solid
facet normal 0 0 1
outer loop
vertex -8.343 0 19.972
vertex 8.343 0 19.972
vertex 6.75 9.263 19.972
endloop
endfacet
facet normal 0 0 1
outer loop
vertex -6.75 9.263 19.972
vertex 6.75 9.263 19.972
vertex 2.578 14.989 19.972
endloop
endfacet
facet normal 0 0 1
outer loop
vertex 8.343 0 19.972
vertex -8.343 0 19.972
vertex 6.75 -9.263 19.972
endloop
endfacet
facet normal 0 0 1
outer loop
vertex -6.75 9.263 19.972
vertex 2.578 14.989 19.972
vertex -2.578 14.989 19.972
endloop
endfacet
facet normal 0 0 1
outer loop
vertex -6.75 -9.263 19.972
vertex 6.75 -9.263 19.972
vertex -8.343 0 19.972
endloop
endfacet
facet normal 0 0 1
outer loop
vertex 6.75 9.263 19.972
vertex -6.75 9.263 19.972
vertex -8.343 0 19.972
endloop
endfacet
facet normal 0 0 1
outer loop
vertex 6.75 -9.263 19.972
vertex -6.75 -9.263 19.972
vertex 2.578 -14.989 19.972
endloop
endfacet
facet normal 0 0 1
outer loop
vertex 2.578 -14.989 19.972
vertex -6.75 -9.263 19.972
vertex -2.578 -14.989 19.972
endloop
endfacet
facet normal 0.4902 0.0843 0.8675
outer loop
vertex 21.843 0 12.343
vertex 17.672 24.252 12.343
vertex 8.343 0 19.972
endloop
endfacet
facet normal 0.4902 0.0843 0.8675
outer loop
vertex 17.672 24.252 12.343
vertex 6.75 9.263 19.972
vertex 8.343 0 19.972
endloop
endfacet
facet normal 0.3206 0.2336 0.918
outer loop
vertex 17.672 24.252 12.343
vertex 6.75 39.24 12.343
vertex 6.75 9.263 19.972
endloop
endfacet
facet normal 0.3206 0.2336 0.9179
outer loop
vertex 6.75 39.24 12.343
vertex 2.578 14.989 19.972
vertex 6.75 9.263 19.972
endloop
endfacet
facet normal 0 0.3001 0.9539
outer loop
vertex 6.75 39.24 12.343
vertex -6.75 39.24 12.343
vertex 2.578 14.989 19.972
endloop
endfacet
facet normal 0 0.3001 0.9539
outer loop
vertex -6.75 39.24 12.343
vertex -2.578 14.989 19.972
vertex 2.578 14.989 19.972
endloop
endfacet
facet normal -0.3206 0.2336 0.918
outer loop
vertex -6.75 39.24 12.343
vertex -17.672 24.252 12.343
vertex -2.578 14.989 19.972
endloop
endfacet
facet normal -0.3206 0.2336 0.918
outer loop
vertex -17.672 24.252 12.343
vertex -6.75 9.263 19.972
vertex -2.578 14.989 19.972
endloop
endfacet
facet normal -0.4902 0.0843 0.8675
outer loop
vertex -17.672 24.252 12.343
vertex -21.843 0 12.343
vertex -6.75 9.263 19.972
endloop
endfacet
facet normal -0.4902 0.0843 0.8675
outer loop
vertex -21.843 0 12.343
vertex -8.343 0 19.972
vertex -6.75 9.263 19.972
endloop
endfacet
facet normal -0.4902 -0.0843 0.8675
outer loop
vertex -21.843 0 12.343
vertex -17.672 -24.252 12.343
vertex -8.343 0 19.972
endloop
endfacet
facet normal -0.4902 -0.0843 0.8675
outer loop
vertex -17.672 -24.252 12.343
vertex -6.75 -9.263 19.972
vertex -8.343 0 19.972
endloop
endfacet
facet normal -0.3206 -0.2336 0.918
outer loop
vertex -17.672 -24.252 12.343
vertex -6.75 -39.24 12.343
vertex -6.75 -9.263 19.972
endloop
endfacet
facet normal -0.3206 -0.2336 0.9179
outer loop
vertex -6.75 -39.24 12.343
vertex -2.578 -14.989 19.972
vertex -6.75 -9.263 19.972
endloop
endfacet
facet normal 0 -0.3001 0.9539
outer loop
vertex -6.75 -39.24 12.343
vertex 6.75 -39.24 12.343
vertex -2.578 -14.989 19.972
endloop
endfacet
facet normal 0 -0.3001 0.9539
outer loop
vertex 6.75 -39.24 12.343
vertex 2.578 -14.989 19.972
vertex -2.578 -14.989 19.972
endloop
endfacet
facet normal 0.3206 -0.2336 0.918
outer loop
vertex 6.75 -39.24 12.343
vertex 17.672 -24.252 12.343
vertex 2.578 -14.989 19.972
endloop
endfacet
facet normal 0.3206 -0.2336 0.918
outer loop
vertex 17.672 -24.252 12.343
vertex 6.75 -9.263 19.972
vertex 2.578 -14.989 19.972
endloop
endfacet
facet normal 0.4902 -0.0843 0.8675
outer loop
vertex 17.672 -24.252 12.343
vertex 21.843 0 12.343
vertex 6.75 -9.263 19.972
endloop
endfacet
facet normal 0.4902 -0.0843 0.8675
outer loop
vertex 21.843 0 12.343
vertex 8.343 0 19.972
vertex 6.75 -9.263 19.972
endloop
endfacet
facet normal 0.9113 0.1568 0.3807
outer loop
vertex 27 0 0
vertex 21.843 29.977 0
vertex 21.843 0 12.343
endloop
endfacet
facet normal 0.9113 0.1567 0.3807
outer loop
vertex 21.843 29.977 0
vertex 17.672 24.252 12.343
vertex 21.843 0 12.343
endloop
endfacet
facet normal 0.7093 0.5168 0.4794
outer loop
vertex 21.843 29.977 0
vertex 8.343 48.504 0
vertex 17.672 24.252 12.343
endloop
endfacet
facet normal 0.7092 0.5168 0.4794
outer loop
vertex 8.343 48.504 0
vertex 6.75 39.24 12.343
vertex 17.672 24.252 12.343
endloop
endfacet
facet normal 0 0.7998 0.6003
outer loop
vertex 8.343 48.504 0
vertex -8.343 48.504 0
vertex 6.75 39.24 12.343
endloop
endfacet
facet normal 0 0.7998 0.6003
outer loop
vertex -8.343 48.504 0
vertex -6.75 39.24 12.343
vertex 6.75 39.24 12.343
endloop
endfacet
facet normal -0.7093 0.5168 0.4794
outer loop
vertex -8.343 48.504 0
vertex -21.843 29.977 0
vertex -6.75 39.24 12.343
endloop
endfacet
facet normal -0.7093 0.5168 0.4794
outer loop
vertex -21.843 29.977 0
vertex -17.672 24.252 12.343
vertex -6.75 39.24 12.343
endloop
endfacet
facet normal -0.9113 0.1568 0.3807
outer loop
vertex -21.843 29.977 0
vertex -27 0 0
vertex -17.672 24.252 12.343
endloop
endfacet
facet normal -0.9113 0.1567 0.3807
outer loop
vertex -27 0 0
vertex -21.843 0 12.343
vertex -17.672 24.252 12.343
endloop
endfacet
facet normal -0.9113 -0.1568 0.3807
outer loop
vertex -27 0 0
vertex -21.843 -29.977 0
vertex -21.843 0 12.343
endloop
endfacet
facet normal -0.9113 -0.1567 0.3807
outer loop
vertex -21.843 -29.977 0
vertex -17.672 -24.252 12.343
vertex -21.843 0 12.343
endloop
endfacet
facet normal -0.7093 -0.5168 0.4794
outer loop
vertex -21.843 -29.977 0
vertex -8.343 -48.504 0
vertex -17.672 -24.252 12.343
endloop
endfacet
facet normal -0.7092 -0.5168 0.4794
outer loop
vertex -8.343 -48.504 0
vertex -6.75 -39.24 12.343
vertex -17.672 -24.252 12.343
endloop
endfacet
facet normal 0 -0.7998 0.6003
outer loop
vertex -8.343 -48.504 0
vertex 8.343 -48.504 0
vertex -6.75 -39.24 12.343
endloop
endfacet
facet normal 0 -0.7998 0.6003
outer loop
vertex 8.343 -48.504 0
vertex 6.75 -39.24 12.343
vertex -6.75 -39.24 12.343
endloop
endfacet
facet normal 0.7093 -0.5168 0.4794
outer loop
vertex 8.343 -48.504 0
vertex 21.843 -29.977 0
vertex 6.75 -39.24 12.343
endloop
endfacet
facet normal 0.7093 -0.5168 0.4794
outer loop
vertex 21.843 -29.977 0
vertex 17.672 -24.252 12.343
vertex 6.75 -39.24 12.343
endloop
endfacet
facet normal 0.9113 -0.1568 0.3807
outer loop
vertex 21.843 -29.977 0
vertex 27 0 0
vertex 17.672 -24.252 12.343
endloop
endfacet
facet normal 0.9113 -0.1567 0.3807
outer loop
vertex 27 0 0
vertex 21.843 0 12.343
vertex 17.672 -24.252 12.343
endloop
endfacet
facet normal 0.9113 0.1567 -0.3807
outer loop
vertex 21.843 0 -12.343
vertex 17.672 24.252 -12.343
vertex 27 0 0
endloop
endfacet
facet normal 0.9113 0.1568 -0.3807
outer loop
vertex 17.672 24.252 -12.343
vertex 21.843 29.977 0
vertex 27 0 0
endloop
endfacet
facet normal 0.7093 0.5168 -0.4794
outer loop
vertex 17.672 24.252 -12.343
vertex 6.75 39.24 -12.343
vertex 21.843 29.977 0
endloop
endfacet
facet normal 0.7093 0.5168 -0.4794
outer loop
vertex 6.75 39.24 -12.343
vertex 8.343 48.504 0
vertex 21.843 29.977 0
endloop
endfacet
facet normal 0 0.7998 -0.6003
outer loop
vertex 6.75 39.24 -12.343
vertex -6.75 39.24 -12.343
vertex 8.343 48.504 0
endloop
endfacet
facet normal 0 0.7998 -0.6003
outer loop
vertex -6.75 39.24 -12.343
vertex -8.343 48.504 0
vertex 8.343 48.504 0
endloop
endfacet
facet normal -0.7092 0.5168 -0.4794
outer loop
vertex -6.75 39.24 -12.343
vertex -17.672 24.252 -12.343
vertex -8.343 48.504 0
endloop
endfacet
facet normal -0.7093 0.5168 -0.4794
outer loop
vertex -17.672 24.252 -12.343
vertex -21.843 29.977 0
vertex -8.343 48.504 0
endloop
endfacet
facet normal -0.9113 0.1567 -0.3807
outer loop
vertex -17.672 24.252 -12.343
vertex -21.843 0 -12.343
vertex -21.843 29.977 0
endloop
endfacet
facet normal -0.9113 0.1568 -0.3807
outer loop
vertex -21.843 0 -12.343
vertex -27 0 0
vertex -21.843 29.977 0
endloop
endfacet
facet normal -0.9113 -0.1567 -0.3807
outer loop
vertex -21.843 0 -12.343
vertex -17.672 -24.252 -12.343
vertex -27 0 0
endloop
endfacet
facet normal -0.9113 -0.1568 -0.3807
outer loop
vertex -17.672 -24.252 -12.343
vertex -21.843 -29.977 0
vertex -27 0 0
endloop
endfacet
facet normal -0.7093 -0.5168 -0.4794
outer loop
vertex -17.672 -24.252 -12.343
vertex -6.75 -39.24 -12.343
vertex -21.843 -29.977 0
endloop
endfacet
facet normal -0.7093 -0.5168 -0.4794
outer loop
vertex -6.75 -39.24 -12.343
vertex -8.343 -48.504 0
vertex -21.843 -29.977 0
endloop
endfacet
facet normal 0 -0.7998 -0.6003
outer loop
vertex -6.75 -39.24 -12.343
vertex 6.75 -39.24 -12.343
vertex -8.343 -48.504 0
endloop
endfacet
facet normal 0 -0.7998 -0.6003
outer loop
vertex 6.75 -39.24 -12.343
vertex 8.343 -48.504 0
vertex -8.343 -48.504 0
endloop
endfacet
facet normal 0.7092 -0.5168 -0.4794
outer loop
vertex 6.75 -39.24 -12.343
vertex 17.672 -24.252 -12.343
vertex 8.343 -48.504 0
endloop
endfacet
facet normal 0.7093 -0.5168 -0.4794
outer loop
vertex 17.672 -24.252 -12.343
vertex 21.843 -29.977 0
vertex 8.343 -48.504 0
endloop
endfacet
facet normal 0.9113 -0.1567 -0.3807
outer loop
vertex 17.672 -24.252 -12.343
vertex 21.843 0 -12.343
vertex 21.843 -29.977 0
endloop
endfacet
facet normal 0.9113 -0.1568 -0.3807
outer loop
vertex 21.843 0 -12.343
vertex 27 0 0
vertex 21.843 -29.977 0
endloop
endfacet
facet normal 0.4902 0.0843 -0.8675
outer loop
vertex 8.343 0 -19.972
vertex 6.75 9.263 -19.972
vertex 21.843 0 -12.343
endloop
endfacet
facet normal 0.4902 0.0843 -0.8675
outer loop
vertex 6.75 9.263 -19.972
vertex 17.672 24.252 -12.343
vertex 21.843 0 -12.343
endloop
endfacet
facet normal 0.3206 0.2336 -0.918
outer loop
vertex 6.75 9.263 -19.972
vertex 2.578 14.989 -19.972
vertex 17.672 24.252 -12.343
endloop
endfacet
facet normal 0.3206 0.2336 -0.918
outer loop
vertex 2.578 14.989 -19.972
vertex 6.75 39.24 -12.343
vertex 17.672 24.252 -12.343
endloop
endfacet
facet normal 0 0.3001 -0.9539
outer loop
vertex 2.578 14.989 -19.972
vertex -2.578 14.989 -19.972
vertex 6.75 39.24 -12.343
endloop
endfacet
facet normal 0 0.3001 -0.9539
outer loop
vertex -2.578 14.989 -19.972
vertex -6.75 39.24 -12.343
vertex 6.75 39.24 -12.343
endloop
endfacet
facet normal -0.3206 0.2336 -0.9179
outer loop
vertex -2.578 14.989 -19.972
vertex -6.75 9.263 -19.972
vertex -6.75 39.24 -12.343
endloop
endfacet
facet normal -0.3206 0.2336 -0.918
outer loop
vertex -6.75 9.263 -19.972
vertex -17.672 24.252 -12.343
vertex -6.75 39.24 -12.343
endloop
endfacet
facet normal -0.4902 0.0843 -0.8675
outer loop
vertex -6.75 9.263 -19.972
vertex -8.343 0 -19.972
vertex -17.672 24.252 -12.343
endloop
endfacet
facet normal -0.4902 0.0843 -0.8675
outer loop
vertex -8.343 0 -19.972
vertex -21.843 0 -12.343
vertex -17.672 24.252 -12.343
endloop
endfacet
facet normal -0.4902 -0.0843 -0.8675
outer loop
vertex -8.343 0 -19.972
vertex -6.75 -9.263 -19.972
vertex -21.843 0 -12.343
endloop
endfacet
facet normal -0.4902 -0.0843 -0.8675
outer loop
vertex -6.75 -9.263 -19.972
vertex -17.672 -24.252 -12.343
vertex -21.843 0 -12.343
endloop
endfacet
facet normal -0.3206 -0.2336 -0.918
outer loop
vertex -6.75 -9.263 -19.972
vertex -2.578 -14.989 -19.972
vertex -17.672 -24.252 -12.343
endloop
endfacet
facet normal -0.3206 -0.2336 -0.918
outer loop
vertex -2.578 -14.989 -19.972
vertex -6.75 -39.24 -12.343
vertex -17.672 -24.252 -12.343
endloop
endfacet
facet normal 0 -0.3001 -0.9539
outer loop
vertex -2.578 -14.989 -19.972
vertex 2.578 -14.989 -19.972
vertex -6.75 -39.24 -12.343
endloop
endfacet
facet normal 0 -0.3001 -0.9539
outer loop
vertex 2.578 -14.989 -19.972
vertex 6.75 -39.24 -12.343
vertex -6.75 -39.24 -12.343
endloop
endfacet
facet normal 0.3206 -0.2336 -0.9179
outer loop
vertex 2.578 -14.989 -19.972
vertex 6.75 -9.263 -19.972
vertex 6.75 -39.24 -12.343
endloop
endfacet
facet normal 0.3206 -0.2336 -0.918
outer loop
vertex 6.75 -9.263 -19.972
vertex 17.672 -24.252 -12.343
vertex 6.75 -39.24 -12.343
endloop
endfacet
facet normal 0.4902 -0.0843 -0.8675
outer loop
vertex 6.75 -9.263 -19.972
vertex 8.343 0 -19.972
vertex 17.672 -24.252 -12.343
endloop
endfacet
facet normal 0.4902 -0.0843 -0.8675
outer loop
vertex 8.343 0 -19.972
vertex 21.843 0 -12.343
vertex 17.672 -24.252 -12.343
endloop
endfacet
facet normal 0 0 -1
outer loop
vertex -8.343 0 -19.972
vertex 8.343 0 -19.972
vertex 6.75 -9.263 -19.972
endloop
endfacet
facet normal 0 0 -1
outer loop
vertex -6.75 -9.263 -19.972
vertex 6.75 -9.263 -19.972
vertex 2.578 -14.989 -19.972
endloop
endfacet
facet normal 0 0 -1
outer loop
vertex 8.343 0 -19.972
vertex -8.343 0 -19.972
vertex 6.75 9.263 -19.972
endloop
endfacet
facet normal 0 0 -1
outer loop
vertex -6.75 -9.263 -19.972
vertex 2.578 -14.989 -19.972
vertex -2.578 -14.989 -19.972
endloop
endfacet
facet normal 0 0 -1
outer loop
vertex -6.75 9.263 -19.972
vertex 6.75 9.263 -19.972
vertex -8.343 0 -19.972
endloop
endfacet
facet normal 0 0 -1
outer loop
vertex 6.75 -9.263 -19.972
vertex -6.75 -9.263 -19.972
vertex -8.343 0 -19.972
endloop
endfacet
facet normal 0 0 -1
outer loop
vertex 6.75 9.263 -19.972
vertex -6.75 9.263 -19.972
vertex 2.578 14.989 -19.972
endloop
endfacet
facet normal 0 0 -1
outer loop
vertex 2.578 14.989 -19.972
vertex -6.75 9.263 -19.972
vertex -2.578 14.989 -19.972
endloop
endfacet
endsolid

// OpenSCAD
// Generated by SolidPython 1.0.1 on 2020-07-29 00:46:49


scale(v = [9, 17, 7]) {
	sphere(r = 3);
}
/***********************************************
*********      SolidPython code:      **********
************************************************
 
# import packages: SolidPython
from solid import *
from solid.utils import *
from itertools import chain, combinations, permutations


class Resize:

    def __init__(self, scad_file):
        self.scad_file = scad_file
        #self.scad_file = import_scad(scad_file)
        # cone/cylinder param:
        self.r1 = 0
        self.r2 = 0
        self.h = 0
        # rectangular prism param:
        self.w = 0
        self.l = 0
        # ellipse param:
        self.r = 0

    # import OpenScad code (file name corresponds to shape)


    # classify shape + parameters
    def assign(self, param1, param2, param3):
        if self.scad_file == 'cone.scad':
            self.r1 = param1
            self.r2 = param2
            self.h = param3
        elif self.scad_file == 'cylinder.scad':
            self.r1 = param1
            self.r2 = param2
            self.h = param3
        elif self.scad_file == 'rectangularPrism.scad':
            self.h = param1
            self.l = param2
            self.w = param3
        else:
            self.r = param1
            self.h = param2

    # resize parameters
    def iterate(self):
        x = range(3, 20, 2)
        i = 1
        if self.scad_file == 'cone.scad':
            tempList = list(permutations(x, 2))
            for temp in tempList:
                param1 = temp[0]
                param2 = temp[1]
                filepath = 'produced_scad_files/' + 'cone' + str(param1) + '_' + str(param2) + '_' + '.scad'
                scad_render_to_file(cylinder(h=param1, r1=param2, r2=0), filepath)

        elif self.scad_file == 'cylinder.scad':
            tempList = list(permutations(x, 3))
            for temp in tempList:
                param1 = temp[0]
                param2 = temp[1]
                filepath = 'produced_scad_files/' + 'cylinder' + str(param1) + '_' + str(param2) + '_' + '.scad'
                scad_render_to_file(cylinder(h=param1, r1=param2, r2=param2), filepath)

        elif self.scad_file == 'rectangularPrism.scad':
            tempList = list(permutations(x, 3))
            for temp in tempList:
                param1 = temp[0]
                param2 = temp[1]
                param3 = temp[2]
                filepath = 'produced_scad_files/' + 'rectangularPrism' + str(param1) + '_' + str(param2) + '_' + str(
                    param3) + '.scad'
                scad_render_to_file(cube(size=(param1, param2, param3)), filepath)

        elif self.scad_file == 'ellipse.scad':
            tempList = list(permutations(x, 4))
            for temp in tempList:
                param1 = temp[0]
                param2 = temp[1]
                param3 = temp[2]
                param4 = temp[3]
                filepath = 'produced_scad_files/' + 'ellipse' + str(param1) + '_' + str(param2) + '_' + str(param3) + '_' + str(param4) + '.scad'
                scad_render_to_file(scale([param1, param2, param3])(sphere(r=param4)), filepath)

    def render_to_scadfile(self):
        scad_render_to_file(scad, 'example.scad') 
 
************************************************/
